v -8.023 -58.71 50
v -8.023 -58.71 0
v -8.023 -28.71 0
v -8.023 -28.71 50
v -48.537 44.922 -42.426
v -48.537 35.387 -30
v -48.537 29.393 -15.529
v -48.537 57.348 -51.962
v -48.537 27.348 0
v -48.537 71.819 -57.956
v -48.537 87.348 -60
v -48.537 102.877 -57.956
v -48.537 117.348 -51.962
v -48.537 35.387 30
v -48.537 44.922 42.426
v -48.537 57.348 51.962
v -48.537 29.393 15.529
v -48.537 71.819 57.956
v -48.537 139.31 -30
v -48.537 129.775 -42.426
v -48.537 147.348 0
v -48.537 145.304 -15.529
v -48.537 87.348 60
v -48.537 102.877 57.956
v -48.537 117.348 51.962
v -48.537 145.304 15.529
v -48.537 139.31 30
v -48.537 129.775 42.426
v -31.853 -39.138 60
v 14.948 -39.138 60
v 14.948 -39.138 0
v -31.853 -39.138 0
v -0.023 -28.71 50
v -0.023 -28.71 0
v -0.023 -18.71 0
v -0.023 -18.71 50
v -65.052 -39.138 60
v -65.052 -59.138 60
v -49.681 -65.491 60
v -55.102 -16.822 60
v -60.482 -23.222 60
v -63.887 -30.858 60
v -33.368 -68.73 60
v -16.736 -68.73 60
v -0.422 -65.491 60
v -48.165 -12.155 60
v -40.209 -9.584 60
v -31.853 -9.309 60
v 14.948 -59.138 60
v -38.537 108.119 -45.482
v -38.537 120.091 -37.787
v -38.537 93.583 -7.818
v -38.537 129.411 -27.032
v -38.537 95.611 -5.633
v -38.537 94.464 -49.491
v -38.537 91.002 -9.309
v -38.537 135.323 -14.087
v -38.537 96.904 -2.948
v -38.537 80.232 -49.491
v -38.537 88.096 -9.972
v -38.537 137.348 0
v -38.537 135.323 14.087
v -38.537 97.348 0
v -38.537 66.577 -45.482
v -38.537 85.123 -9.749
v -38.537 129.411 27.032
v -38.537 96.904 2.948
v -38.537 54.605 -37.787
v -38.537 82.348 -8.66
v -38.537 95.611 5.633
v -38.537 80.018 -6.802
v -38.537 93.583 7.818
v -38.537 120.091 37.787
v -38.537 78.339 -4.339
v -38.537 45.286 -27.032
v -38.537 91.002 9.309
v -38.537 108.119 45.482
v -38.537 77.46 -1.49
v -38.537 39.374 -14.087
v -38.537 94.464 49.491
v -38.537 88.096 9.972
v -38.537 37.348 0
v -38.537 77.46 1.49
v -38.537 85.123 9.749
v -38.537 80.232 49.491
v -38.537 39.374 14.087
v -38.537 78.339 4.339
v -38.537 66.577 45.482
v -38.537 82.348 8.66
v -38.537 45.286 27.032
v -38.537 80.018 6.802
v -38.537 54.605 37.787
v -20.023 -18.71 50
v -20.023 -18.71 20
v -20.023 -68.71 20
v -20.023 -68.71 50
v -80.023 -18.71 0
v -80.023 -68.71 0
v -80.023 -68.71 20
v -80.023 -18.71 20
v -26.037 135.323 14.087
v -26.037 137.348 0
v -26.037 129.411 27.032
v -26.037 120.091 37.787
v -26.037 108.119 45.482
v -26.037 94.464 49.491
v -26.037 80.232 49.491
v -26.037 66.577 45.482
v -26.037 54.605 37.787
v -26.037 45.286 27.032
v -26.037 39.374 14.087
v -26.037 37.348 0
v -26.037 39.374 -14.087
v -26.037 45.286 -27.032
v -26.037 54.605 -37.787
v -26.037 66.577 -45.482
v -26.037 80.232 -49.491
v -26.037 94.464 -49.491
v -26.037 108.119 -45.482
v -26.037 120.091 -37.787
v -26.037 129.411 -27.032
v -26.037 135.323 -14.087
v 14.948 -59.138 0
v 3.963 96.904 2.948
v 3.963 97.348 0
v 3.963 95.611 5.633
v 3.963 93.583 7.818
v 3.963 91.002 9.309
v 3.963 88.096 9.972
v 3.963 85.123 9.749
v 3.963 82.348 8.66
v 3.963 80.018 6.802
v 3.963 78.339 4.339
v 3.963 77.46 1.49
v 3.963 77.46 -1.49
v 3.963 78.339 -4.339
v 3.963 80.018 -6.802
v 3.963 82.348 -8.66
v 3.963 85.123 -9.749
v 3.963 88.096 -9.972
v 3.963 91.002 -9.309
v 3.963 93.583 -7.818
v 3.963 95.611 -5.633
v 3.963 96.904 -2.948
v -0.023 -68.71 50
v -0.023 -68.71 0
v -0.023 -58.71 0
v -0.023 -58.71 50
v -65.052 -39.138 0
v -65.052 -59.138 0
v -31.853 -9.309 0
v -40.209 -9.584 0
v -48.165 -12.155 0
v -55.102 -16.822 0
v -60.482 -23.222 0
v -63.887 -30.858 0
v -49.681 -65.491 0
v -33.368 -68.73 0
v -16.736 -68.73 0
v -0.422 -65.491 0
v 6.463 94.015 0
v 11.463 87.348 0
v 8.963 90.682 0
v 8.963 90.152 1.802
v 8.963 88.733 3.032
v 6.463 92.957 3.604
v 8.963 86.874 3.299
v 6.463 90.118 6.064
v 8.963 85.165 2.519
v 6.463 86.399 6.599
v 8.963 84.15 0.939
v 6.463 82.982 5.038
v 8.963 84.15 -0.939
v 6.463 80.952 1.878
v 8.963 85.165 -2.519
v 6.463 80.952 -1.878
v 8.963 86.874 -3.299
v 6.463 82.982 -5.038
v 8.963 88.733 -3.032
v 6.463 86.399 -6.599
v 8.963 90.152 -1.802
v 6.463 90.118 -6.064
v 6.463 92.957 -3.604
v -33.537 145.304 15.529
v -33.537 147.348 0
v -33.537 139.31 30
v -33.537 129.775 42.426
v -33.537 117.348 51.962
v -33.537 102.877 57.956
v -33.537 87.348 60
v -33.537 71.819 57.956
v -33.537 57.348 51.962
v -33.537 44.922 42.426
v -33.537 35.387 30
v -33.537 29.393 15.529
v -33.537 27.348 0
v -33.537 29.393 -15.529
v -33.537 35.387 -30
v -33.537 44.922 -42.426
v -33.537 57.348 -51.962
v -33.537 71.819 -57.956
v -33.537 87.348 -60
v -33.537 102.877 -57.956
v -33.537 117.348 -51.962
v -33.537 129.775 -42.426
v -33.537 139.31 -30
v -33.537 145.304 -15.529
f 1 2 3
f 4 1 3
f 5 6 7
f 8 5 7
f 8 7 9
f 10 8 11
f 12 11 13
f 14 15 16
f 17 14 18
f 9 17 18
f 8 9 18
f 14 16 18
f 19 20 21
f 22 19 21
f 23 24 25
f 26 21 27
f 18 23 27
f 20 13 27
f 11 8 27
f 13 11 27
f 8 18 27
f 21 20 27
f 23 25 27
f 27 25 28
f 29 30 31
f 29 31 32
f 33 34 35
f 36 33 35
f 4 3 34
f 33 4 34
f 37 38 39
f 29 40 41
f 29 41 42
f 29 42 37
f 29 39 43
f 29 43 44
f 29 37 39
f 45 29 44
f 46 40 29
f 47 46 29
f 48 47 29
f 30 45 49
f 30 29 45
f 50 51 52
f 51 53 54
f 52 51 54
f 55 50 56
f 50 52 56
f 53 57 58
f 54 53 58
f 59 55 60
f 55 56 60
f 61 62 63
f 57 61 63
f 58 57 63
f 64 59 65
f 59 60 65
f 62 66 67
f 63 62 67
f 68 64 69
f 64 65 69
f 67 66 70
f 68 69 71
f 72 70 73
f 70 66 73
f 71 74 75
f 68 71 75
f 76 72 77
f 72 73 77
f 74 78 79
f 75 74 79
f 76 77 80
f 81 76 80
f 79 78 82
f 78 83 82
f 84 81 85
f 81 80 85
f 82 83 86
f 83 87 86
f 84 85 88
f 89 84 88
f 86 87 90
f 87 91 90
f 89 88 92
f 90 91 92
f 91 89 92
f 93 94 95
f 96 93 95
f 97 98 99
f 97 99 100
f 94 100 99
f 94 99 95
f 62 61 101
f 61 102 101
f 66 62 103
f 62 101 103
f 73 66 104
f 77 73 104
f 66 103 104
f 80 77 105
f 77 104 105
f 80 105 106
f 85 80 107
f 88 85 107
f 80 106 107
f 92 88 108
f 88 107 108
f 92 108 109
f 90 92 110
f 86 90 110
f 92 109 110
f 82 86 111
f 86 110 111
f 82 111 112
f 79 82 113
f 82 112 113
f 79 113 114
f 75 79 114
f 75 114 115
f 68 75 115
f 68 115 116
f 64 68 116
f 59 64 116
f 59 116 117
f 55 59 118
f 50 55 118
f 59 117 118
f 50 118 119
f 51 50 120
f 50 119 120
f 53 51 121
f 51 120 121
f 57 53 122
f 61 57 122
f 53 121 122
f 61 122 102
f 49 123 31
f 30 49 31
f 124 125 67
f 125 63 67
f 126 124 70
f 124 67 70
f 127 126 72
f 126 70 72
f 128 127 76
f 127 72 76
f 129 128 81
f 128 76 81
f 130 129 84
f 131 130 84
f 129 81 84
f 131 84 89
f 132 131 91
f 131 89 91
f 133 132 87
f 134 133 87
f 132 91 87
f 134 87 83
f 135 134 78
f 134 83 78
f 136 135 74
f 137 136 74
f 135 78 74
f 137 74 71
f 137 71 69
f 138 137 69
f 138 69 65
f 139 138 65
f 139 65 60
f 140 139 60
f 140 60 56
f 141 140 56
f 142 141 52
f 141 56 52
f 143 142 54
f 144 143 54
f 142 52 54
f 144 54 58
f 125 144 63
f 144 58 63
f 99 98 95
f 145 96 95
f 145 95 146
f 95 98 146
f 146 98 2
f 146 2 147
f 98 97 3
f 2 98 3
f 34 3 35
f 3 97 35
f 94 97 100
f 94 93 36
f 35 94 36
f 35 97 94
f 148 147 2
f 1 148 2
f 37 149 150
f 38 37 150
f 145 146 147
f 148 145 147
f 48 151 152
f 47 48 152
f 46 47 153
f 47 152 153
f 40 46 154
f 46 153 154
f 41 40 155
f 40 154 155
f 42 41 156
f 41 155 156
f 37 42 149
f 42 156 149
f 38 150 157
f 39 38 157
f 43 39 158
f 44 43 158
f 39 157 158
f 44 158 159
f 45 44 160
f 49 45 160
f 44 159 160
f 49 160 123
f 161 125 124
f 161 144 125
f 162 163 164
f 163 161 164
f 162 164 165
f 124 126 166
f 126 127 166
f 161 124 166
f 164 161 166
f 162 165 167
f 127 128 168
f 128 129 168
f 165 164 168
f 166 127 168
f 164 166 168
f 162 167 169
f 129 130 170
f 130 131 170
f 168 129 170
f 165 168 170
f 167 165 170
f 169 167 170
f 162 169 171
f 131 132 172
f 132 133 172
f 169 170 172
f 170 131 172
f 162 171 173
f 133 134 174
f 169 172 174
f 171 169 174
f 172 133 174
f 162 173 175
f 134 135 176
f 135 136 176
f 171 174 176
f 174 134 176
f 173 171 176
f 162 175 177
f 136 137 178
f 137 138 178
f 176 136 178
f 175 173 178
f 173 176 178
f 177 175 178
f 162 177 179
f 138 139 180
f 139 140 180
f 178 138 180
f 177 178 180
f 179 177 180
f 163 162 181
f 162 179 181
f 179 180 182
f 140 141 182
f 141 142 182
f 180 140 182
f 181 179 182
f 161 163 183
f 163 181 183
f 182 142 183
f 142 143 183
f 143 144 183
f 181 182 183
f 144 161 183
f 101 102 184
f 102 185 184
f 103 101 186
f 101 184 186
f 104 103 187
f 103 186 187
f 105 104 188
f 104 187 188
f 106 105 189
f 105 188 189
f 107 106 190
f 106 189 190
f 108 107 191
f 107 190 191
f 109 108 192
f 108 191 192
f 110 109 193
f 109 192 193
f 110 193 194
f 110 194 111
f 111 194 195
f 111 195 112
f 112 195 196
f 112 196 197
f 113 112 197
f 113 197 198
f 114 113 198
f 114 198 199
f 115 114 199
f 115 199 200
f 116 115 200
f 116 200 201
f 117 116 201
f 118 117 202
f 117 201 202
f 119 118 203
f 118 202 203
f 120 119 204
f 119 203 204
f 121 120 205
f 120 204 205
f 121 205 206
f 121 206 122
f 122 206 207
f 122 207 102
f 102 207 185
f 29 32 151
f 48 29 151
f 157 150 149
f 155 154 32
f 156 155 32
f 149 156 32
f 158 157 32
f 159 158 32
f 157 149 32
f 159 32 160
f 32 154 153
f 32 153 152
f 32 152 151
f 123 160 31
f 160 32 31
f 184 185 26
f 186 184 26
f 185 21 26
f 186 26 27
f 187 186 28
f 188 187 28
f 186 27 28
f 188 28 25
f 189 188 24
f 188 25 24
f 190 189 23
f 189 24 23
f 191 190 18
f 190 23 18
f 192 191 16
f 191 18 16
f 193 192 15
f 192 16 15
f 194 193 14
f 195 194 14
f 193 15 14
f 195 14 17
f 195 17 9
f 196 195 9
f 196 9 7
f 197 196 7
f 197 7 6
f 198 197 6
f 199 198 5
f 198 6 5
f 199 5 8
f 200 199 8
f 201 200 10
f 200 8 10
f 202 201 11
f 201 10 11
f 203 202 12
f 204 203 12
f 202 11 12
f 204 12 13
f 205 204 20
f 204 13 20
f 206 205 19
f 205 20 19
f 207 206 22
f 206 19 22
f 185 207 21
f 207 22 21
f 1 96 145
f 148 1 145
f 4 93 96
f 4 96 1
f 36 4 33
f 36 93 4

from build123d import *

# Parameters (mm, degrees)
F2_DEPTH = 60
F5_DEPTH = 50
F4_W     = 60
F4_H     = 50
F6_DEPTH = 20


with BuildPart() as f2:
    # F1 (on Top) → F2 (new body)
    with BuildSketch(Plane.XY):
        with BuildLine():
            Line((-31.8526111987, -39.1376554476), (-31.8526111987, -9.3087305754))
            ThreePointArc((-31.8526111987, -9.3087305754), (-55.1020833547, -16.8219917846), (-65.0518675135, -39.1376554476))
            Line((-65.0518675135, -39.1376554476), (-65.0518675135, -59.1376554476))
            ThreePointArc((-65.0518675135, -59.1376554476), (-25.0518675135, -69.1376554476), (14.9481324865, -59.1376554476))
            Line((14.9481324865, -59.1376554476), (14.9481324865, -39.1376554476))
            Line((14.9481324865, -39.1376554476), (-31.8526111987, -39.1376554476))
        make_face()
    extrude(amount=F2_DEPTH)


with BuildPart() as f3:
    # F0 (on Top) → F3 (revolve)
    with BuildSketch(Plane.XY):
        Polygon((-33.5372266173, 147.348228097), (-48.5372266173, 147.348228097), (-48.5372266173, 87.348228097), (11.4627733827, 87.348228097), (3.9627733824, 97.348228097), (-38.5372266173, 97.348228097), (-38.5372266173, 137.348228097), (-26.0372266173, 137.348228097), align=None)
    revolve(axis=Axis((-18.5372266173, 87.348228097, 0), (1, 0, 0)))


with BuildPart() as f5:
    # F4 (on Top) → F5 (new body)
    with BuildSketch(Plane.XY):
        Polygon((-20.023245162, -18.7104548417), (-20.023245162, -68.7104548417), (-0.023245162, -68.7104548417), (-0.023245162, -58.7104548417), (-8.023245162, -58.7104548417), (-8.023245162, -28.7104548417), (-0.023245162, -28.7104548417), (-0.023245162, -18.7104548417), align=None)
    extrude(amount=F5_DEPTH)

    # F4 (on Top) → F6 (join)
    with BuildSketch(Plane.XY):
        with Locations((-50.023245162, -43.7104548417)):
            Rectangle(F4_W, F4_H)
    extrude(amount=F6_DEPTH)


solid = Compound([f2.part, f3.part, f5.part])
